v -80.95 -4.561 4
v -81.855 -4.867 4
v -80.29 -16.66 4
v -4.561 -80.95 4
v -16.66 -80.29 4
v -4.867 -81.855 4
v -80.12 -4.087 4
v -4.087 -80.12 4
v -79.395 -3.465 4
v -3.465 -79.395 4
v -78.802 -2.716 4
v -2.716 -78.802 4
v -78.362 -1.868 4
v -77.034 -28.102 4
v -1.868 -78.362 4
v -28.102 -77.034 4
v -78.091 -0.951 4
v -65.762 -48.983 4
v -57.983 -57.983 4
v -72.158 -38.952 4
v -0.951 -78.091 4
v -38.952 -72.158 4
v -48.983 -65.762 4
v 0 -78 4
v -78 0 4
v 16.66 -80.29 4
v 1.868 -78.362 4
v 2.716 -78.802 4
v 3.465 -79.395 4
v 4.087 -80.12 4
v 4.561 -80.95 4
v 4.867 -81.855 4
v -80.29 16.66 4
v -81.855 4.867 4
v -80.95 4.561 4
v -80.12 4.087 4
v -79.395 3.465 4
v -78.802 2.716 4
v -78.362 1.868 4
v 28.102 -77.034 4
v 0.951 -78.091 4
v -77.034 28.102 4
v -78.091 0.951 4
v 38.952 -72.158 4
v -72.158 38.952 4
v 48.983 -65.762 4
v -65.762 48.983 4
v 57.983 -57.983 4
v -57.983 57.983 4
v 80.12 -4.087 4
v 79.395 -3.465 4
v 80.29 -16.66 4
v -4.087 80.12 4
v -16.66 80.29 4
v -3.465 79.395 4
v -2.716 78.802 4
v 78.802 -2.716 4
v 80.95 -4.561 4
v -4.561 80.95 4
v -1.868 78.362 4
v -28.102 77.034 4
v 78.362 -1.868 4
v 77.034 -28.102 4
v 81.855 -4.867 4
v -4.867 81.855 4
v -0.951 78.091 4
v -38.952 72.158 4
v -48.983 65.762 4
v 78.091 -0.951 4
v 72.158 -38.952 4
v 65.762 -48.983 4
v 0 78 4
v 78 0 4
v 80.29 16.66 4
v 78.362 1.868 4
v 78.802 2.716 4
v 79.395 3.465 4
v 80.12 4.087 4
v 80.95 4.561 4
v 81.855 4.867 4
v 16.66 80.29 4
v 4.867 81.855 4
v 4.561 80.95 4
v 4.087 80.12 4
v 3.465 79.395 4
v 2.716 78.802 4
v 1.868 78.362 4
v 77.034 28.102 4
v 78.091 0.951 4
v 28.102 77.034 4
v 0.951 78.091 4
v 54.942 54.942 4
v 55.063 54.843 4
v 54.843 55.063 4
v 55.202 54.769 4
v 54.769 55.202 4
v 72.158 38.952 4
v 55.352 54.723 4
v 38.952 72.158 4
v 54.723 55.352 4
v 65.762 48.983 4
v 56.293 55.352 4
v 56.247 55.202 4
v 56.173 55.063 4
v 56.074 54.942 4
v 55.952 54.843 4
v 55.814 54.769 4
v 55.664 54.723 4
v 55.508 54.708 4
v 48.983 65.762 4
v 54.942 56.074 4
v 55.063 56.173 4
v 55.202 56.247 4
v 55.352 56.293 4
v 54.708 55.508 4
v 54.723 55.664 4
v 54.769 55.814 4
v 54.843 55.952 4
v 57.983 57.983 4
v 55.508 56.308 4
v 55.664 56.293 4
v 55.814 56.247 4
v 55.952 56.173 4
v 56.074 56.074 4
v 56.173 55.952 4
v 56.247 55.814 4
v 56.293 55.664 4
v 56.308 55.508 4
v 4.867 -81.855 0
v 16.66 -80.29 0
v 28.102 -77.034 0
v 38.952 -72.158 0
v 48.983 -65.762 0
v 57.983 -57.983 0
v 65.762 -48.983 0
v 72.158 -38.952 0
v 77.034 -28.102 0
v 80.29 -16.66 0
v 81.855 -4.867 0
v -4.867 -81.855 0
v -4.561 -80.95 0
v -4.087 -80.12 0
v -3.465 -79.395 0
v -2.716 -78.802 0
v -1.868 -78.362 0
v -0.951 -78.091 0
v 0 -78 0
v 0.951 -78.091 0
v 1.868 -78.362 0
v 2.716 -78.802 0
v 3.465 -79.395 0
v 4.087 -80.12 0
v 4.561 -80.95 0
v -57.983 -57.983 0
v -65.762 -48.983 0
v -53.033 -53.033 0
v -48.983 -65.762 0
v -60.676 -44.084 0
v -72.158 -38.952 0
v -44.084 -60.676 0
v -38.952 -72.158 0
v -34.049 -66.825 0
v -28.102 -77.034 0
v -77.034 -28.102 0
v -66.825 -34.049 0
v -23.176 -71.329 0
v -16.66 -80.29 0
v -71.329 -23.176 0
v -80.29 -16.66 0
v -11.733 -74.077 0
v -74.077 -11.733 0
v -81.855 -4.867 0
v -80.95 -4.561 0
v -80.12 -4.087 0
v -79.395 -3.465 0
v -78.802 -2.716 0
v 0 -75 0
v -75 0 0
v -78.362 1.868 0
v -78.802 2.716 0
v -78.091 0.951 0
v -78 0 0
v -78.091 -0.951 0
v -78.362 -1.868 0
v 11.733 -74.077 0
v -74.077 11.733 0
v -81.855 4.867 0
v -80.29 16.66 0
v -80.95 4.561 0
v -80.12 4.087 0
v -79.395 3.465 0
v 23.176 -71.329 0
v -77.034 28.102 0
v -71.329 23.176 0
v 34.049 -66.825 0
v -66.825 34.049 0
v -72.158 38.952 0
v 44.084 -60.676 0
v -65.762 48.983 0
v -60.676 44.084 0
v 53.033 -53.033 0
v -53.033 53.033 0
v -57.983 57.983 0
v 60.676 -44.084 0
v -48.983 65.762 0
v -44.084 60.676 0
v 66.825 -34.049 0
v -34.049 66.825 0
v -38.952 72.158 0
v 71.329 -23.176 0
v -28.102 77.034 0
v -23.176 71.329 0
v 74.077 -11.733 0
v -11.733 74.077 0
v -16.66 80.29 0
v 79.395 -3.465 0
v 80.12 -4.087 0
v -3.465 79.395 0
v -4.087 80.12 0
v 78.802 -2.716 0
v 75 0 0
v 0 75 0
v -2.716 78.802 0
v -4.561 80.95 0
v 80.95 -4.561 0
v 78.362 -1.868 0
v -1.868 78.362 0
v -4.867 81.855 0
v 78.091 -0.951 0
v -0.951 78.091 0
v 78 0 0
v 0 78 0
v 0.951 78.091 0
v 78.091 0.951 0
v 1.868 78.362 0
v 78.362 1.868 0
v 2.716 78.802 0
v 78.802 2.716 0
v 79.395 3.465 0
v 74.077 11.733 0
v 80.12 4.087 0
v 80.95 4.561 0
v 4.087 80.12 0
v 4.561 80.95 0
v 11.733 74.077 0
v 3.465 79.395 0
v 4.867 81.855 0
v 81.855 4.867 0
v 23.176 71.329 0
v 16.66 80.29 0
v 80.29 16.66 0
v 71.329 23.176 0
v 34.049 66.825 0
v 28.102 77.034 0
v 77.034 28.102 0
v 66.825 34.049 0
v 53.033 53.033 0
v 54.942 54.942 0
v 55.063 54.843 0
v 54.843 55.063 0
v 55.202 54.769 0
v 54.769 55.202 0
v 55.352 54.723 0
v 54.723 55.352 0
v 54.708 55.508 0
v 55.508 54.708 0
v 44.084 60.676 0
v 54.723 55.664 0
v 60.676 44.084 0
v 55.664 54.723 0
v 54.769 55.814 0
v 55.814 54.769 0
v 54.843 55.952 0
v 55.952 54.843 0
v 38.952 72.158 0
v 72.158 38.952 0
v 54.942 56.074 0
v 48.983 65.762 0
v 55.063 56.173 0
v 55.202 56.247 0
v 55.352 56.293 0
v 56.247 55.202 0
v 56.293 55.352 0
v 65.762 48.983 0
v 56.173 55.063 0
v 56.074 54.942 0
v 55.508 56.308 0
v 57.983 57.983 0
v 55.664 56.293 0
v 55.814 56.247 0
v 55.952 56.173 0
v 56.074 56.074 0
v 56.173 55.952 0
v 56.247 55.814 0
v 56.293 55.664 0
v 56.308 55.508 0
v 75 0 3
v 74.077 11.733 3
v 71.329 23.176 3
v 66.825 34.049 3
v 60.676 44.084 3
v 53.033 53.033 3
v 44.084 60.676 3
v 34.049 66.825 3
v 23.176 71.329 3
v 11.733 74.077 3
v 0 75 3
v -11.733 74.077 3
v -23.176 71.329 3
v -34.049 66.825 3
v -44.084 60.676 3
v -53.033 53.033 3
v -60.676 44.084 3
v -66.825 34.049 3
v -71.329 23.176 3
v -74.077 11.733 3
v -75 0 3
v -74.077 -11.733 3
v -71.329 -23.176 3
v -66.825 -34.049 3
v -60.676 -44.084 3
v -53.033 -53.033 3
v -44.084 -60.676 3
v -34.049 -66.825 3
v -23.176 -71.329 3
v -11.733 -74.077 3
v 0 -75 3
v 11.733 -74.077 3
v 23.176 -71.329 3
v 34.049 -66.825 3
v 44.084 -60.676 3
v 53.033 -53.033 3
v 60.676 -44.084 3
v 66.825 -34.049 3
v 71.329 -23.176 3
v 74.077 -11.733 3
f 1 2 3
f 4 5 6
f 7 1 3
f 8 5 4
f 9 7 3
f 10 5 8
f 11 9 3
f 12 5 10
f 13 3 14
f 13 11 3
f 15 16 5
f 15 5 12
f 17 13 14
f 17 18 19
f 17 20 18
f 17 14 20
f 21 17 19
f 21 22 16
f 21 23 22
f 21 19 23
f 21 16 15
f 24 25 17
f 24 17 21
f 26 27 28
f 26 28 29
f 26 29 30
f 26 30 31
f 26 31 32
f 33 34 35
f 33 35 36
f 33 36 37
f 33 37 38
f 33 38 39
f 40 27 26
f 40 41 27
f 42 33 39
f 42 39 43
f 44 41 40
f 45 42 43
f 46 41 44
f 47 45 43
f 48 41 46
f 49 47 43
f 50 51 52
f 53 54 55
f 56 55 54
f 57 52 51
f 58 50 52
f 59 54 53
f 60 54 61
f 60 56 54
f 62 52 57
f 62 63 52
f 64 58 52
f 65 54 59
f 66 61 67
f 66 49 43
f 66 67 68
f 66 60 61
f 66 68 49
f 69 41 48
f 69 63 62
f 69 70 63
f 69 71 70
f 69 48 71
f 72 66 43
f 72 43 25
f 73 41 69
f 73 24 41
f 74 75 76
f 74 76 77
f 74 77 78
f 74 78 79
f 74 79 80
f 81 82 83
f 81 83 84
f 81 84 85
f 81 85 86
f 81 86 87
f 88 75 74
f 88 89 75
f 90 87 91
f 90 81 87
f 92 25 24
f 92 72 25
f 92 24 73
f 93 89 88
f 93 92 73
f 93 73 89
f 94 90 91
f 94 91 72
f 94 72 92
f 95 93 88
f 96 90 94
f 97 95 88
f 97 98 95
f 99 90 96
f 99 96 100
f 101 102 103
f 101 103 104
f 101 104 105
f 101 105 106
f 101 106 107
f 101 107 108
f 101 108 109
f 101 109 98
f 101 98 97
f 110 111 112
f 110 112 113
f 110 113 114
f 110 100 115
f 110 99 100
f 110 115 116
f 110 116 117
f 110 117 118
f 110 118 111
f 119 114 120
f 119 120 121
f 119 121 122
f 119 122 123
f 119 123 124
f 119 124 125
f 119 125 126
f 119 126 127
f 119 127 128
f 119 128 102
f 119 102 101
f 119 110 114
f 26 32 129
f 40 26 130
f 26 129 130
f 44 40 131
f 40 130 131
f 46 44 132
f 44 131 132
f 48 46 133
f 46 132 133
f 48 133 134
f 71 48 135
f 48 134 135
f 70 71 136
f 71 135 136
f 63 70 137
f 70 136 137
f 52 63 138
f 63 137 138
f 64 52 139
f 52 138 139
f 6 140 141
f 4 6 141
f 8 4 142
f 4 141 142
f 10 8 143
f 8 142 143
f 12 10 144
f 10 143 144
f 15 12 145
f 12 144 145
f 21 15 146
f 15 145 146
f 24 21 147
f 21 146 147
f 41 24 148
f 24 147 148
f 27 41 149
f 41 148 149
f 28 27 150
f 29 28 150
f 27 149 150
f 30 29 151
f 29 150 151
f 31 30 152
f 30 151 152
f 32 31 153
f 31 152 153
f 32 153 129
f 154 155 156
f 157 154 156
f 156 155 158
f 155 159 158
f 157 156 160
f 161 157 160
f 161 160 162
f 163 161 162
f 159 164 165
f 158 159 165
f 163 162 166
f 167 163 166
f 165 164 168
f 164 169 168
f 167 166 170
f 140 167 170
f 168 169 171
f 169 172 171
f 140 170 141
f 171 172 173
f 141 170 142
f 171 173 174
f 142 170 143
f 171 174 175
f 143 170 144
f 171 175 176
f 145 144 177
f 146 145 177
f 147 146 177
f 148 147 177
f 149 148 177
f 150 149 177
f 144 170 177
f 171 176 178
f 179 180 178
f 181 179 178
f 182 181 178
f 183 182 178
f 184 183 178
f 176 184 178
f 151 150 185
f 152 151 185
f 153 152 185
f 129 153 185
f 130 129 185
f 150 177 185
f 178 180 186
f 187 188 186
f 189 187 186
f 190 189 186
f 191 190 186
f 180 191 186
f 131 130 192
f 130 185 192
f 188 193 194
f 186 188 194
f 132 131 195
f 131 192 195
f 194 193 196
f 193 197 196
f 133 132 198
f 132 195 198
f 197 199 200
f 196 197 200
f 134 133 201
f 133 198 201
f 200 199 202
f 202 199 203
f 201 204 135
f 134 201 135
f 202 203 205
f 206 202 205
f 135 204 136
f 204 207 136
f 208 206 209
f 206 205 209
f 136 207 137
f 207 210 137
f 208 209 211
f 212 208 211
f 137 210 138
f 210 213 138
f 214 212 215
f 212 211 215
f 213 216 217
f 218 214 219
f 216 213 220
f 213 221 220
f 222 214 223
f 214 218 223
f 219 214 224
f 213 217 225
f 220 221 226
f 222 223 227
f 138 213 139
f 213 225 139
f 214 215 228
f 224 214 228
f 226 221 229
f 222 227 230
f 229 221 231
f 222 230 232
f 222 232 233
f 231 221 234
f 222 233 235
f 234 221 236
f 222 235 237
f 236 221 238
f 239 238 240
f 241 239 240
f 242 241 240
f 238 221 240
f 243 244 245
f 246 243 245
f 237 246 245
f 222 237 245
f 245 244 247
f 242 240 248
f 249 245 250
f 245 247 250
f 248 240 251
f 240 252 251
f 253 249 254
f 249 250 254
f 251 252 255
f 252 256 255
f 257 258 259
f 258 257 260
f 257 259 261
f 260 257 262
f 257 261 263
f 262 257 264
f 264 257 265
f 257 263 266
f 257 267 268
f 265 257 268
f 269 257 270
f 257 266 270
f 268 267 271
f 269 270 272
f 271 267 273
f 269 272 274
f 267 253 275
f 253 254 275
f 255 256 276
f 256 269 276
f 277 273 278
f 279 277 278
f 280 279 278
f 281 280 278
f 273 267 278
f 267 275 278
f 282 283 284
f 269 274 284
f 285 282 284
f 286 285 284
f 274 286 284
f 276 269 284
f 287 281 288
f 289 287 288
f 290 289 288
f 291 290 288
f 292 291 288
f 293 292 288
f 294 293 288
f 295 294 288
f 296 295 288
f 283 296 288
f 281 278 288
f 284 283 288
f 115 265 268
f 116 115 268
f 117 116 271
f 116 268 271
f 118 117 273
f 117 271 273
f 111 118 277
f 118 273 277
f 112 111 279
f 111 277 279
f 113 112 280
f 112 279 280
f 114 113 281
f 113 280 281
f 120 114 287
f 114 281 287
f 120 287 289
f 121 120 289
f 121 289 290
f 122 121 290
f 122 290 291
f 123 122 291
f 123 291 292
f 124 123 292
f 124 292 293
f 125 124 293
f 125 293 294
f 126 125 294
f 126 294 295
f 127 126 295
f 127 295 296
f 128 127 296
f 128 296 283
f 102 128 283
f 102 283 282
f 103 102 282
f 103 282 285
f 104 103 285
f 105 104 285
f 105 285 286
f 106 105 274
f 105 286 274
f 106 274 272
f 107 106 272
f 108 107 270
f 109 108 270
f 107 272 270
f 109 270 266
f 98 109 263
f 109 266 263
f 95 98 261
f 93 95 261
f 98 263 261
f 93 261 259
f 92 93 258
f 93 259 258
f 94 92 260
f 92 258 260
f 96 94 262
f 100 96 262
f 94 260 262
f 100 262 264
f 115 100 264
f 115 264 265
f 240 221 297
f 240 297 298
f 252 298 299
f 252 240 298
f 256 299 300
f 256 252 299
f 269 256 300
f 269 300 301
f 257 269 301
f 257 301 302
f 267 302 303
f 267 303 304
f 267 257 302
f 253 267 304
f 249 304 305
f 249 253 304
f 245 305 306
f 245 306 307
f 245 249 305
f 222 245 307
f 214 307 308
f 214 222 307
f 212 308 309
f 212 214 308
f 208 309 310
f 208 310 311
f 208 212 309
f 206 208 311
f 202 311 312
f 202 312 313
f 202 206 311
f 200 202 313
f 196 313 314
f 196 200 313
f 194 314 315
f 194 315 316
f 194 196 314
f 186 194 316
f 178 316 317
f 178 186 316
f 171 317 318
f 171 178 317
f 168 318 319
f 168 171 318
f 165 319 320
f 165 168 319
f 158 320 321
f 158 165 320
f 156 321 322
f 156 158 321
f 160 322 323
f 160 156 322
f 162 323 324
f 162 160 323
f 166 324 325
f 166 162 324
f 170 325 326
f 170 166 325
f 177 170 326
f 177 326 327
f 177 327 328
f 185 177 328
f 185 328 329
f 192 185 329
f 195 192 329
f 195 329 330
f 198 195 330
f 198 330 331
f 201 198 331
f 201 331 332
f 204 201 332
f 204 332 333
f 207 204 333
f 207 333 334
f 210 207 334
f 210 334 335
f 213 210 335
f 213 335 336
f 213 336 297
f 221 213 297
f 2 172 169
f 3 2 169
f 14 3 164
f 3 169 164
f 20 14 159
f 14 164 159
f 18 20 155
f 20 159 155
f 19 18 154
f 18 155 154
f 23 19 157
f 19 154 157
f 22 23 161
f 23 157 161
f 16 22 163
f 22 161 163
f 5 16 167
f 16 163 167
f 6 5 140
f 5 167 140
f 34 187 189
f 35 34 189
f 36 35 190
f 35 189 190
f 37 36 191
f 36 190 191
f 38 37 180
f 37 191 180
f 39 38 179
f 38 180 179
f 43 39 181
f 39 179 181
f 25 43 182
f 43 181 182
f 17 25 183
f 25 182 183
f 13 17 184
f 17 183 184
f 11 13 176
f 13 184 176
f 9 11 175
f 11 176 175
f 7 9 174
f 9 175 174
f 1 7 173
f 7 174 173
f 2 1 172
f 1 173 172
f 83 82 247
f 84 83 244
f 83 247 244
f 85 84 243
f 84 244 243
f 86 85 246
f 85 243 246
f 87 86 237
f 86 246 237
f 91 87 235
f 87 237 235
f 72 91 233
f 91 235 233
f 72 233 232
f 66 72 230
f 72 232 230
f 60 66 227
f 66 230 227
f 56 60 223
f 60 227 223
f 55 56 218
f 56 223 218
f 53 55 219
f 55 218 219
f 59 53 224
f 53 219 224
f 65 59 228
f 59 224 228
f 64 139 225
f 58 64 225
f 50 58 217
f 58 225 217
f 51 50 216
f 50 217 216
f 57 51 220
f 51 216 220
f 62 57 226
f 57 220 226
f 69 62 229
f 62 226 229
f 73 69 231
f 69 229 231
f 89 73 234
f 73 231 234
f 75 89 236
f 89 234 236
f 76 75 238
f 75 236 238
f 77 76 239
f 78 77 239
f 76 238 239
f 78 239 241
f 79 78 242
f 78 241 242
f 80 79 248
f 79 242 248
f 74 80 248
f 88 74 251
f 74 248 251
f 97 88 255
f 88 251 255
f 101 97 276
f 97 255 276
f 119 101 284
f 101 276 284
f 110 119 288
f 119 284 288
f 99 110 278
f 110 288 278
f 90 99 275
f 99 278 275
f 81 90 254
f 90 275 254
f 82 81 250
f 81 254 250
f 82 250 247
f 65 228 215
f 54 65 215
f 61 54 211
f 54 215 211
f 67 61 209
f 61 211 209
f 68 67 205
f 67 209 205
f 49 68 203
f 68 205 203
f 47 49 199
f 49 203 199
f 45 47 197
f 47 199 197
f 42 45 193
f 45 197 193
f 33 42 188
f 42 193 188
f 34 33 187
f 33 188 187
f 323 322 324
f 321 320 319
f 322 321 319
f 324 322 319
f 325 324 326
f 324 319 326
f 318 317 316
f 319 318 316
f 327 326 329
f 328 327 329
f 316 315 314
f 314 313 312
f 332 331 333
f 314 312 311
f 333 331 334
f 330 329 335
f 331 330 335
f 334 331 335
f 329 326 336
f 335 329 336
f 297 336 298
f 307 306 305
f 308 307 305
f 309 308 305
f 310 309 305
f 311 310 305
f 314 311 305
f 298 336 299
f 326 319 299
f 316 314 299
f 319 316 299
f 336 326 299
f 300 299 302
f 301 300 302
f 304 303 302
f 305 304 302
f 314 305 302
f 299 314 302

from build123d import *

# Parameters (mm, degrees)
SKETCH1_R             = 82
SKETCH1_R_2           = 75
BOSS_EXTRUDE1_DEPTH   = 3
SKETCH2_R             = 82
BOSS_EXTRUDE2_DEPTH   = 1
SKETCH4_R             = 5
CUT_EXTRUDE1_DEPTH    = 117.034477635
CIRPATTERN1_COUNT     = 4
M2X0_4_TAPPED_HOLE1_D = 1.6


with BuildPart() as part:
    # Sketch1 → Boss-Extrude1 (new body)
    with BuildSketch(Plane.XY):
        Circle(SKETCH1_R)
        Circle(SKETCH1_R_2, mode=Mode.SUBTRACT)
    extrude(amount=BOSS_EXTRUDE1_DEPTH)

    # Sketch2 → Boss-Extrude2 (add)
    with BuildSketch(Plane.XY.offset(3)):
        Circle(SKETCH2_R)
    extrude(amount=BOSS_EXTRUDE2_DEPTH)

    # Sketch4 → Cut-Extrude1 (cut, through all)
    with BuildSketch(Plane(origin=(0, 0, 0), x_dir=(-1, 0, 0), z_dir=(0, 0, -1))):
        with Locations((0, 83)):
            Circle(SKETCH4_R)
    cut_extrude1 = extrude(amount=-CUT_EXTRUDE1_DEPTH, mode=Mode.SUBTRACT)

    # CirPattern1: Cut-Extrude1 ×4 about axis
    cirpattern1_axis = Axis((0, 0, 0), (0, 0, 1))
    for i in range(1, CIRPATTERN1_COUNT):
        add(cut_extrude1.rotate(cirpattern1_axis, i * 360 / CIRPATTERN1_COUNT), mode=Mode.SUBTRACT)

    # M2x0.4 Tapped Hole1 (through all)
    with Locations(Plane.XY.offset(4)):
        with Locations((55.507882323, 55.507882323)):
            Hole(M2X0_4_TAPPED_HOLE1_D / 2)


solid = part.part
